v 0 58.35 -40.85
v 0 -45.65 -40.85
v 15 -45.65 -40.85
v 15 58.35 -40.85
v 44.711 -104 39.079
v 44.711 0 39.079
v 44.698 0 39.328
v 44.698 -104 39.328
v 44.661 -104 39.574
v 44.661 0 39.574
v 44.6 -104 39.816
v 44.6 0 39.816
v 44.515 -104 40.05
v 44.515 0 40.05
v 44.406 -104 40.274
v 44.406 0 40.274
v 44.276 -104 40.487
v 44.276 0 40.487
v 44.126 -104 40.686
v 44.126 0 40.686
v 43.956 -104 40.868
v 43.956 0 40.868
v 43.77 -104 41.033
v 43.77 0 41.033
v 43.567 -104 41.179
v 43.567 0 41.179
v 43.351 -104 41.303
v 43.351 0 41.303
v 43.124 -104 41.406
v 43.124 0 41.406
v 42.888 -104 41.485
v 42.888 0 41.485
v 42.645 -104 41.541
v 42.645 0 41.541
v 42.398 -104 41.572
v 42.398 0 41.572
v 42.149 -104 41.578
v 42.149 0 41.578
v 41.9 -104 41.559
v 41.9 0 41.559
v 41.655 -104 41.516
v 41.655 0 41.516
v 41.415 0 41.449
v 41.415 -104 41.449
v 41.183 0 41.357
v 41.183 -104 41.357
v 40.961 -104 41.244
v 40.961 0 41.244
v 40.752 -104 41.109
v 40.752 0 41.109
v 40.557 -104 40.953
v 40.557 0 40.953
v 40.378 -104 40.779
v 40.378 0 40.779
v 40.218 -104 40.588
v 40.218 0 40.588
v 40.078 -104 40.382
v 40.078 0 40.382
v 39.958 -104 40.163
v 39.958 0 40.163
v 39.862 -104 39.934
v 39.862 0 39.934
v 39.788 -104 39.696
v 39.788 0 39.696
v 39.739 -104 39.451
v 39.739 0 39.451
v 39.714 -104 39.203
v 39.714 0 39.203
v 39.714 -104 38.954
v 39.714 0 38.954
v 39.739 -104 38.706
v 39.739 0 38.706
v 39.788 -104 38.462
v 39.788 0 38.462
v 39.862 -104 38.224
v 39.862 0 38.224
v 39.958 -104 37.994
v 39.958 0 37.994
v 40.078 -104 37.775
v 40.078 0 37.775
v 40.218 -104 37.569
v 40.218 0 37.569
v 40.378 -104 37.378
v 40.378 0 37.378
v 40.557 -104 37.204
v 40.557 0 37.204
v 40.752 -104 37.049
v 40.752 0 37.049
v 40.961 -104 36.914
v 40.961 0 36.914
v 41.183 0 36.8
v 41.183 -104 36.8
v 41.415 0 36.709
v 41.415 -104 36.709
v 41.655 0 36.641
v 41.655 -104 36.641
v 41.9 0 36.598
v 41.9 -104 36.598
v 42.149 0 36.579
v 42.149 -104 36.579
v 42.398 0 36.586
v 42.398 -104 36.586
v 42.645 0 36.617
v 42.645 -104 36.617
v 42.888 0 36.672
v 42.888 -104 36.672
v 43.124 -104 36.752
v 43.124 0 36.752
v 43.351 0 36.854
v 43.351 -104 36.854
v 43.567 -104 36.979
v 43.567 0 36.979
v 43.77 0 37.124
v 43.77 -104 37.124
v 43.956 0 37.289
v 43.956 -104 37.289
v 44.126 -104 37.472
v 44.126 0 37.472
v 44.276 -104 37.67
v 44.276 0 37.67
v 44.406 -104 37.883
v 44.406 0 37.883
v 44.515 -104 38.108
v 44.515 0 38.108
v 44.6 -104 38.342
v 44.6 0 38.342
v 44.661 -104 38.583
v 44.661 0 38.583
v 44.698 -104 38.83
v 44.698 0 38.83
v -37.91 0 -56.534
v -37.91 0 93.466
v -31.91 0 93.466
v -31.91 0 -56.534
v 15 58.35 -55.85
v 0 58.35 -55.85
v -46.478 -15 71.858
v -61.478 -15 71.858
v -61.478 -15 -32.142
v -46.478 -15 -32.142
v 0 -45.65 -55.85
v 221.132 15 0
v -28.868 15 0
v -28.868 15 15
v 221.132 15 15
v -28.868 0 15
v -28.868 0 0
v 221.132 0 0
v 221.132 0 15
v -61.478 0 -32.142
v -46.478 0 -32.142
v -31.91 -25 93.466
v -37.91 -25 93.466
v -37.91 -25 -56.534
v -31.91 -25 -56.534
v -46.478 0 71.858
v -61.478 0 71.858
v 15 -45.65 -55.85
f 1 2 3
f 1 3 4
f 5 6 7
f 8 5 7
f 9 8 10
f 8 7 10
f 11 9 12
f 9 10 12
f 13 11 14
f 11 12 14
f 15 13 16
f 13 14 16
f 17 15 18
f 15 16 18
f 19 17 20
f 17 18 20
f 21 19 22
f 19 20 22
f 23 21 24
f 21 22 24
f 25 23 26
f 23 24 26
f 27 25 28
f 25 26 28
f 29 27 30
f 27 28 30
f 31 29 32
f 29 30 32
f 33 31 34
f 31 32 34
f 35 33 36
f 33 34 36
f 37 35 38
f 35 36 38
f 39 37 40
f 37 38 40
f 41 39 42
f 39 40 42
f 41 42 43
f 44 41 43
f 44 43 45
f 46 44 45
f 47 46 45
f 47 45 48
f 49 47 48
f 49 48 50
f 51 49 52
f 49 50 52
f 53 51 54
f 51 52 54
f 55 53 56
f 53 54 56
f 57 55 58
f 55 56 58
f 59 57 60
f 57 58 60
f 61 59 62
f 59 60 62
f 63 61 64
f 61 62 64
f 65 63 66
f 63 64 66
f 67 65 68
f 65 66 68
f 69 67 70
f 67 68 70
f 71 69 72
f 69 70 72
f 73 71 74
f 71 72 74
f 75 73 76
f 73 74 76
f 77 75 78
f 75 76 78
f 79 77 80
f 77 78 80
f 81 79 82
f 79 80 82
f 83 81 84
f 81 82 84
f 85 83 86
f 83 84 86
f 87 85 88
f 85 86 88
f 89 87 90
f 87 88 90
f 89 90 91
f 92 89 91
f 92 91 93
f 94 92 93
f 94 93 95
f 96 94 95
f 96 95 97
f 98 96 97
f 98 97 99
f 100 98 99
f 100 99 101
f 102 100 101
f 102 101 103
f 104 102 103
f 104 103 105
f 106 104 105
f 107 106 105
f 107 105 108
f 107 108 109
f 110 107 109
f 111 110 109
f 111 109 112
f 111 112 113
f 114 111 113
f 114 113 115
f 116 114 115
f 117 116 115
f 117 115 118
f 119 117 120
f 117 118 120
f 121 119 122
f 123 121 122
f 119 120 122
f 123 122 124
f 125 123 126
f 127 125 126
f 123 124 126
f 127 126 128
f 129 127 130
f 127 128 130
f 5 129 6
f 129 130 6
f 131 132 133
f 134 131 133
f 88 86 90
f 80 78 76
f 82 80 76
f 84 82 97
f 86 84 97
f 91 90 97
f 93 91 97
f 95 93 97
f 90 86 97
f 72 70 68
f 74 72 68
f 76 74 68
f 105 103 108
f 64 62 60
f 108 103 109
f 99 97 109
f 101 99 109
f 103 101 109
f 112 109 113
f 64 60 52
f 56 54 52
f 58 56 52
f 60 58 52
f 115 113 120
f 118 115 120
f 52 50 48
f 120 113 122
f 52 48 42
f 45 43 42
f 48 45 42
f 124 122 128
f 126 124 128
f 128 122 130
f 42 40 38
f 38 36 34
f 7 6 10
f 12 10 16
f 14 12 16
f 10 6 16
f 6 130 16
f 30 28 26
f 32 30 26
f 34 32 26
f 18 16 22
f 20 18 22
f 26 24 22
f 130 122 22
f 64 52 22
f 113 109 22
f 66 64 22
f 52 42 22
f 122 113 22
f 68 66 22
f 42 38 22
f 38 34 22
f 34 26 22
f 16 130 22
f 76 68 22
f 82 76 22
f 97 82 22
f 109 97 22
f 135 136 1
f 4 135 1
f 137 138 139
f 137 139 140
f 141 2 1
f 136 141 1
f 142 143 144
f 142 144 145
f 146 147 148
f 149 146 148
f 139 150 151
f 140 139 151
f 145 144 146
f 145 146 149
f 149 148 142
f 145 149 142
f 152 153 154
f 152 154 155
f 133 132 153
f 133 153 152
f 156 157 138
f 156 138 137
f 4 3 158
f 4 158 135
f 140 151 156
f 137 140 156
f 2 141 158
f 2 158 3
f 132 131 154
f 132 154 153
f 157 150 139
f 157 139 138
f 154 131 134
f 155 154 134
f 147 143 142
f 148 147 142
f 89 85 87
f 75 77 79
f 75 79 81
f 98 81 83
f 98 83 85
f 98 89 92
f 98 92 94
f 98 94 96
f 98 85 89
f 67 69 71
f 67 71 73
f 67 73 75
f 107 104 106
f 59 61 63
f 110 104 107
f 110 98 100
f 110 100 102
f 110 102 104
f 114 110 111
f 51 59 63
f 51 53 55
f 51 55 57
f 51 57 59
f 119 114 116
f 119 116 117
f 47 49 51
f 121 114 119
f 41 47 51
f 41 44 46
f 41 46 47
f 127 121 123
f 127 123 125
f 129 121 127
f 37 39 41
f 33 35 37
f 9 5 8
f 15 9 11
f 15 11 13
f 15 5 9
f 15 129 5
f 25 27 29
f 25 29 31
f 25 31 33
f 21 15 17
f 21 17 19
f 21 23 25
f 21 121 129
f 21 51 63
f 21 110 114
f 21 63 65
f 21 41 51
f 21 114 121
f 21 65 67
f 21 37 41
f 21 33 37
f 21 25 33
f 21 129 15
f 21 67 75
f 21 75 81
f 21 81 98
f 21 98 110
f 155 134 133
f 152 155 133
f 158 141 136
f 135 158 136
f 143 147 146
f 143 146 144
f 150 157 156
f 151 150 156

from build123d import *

# Parameters (mm, degrees)
F0_W     = 250
F0_H     = 15
F1_DEPTH = 15
F2_W     = 104
F2_H     = 15
F3_DEPTH = 15
F4_W     = 15
F4_H     = 104
F5_DEPTH = 15
F6_R     = 2.5
F7_DEPTH = 104
F8_W     = 6
F8_H     = 150
F9_DEPTH = 25


with BuildPart() as f1:
    # F0 (on Top) → F1 (new body)
    with BuildSketch(Plane.XY):
        with Locations((96.132084, 7.5)):
            Rectangle(F0_W, F0_H)
    extrude(amount=F1_DEPTH)


with BuildPart() as f3:
    # F2 (on Right) → F3 (new body)
    with BuildSketch(Plane.YZ):
        with Locations((6.350369, -48.349999)):
            Rectangle(F2_W, F2_H)
    extrude(amount=F3_DEPTH)


with BuildPart() as f5:
    # F4 (on Front) → F5 (new body)
    with BuildSketch(Plane.XZ):
        with Locations((-53.978287, 19.858433)):
            Rectangle(F4_W, F4_H)
    extrude(amount=F5_DEPTH)


with BuildPart() as f7:
    # F6 (on Front) → F7 (new body)
    with BuildSketch(Plane.XZ):
        with Locations((42.210877, 39.07872)):
            Circle(F6_R)
    extrude(amount=F7_DEPTH)


with BuildPart() as f9:
    # F8 (on Front) → F9 (new body)
    with BuildSketch(Plane.XZ):
        with Locations((-34.91004, 18.466359)):
            Rectangle(F8_W, F8_H)
    extrude(amount=F9_DEPTH)


solid = Compound([f1.part, f3.part, f5.part, f7.part, f9.part])
